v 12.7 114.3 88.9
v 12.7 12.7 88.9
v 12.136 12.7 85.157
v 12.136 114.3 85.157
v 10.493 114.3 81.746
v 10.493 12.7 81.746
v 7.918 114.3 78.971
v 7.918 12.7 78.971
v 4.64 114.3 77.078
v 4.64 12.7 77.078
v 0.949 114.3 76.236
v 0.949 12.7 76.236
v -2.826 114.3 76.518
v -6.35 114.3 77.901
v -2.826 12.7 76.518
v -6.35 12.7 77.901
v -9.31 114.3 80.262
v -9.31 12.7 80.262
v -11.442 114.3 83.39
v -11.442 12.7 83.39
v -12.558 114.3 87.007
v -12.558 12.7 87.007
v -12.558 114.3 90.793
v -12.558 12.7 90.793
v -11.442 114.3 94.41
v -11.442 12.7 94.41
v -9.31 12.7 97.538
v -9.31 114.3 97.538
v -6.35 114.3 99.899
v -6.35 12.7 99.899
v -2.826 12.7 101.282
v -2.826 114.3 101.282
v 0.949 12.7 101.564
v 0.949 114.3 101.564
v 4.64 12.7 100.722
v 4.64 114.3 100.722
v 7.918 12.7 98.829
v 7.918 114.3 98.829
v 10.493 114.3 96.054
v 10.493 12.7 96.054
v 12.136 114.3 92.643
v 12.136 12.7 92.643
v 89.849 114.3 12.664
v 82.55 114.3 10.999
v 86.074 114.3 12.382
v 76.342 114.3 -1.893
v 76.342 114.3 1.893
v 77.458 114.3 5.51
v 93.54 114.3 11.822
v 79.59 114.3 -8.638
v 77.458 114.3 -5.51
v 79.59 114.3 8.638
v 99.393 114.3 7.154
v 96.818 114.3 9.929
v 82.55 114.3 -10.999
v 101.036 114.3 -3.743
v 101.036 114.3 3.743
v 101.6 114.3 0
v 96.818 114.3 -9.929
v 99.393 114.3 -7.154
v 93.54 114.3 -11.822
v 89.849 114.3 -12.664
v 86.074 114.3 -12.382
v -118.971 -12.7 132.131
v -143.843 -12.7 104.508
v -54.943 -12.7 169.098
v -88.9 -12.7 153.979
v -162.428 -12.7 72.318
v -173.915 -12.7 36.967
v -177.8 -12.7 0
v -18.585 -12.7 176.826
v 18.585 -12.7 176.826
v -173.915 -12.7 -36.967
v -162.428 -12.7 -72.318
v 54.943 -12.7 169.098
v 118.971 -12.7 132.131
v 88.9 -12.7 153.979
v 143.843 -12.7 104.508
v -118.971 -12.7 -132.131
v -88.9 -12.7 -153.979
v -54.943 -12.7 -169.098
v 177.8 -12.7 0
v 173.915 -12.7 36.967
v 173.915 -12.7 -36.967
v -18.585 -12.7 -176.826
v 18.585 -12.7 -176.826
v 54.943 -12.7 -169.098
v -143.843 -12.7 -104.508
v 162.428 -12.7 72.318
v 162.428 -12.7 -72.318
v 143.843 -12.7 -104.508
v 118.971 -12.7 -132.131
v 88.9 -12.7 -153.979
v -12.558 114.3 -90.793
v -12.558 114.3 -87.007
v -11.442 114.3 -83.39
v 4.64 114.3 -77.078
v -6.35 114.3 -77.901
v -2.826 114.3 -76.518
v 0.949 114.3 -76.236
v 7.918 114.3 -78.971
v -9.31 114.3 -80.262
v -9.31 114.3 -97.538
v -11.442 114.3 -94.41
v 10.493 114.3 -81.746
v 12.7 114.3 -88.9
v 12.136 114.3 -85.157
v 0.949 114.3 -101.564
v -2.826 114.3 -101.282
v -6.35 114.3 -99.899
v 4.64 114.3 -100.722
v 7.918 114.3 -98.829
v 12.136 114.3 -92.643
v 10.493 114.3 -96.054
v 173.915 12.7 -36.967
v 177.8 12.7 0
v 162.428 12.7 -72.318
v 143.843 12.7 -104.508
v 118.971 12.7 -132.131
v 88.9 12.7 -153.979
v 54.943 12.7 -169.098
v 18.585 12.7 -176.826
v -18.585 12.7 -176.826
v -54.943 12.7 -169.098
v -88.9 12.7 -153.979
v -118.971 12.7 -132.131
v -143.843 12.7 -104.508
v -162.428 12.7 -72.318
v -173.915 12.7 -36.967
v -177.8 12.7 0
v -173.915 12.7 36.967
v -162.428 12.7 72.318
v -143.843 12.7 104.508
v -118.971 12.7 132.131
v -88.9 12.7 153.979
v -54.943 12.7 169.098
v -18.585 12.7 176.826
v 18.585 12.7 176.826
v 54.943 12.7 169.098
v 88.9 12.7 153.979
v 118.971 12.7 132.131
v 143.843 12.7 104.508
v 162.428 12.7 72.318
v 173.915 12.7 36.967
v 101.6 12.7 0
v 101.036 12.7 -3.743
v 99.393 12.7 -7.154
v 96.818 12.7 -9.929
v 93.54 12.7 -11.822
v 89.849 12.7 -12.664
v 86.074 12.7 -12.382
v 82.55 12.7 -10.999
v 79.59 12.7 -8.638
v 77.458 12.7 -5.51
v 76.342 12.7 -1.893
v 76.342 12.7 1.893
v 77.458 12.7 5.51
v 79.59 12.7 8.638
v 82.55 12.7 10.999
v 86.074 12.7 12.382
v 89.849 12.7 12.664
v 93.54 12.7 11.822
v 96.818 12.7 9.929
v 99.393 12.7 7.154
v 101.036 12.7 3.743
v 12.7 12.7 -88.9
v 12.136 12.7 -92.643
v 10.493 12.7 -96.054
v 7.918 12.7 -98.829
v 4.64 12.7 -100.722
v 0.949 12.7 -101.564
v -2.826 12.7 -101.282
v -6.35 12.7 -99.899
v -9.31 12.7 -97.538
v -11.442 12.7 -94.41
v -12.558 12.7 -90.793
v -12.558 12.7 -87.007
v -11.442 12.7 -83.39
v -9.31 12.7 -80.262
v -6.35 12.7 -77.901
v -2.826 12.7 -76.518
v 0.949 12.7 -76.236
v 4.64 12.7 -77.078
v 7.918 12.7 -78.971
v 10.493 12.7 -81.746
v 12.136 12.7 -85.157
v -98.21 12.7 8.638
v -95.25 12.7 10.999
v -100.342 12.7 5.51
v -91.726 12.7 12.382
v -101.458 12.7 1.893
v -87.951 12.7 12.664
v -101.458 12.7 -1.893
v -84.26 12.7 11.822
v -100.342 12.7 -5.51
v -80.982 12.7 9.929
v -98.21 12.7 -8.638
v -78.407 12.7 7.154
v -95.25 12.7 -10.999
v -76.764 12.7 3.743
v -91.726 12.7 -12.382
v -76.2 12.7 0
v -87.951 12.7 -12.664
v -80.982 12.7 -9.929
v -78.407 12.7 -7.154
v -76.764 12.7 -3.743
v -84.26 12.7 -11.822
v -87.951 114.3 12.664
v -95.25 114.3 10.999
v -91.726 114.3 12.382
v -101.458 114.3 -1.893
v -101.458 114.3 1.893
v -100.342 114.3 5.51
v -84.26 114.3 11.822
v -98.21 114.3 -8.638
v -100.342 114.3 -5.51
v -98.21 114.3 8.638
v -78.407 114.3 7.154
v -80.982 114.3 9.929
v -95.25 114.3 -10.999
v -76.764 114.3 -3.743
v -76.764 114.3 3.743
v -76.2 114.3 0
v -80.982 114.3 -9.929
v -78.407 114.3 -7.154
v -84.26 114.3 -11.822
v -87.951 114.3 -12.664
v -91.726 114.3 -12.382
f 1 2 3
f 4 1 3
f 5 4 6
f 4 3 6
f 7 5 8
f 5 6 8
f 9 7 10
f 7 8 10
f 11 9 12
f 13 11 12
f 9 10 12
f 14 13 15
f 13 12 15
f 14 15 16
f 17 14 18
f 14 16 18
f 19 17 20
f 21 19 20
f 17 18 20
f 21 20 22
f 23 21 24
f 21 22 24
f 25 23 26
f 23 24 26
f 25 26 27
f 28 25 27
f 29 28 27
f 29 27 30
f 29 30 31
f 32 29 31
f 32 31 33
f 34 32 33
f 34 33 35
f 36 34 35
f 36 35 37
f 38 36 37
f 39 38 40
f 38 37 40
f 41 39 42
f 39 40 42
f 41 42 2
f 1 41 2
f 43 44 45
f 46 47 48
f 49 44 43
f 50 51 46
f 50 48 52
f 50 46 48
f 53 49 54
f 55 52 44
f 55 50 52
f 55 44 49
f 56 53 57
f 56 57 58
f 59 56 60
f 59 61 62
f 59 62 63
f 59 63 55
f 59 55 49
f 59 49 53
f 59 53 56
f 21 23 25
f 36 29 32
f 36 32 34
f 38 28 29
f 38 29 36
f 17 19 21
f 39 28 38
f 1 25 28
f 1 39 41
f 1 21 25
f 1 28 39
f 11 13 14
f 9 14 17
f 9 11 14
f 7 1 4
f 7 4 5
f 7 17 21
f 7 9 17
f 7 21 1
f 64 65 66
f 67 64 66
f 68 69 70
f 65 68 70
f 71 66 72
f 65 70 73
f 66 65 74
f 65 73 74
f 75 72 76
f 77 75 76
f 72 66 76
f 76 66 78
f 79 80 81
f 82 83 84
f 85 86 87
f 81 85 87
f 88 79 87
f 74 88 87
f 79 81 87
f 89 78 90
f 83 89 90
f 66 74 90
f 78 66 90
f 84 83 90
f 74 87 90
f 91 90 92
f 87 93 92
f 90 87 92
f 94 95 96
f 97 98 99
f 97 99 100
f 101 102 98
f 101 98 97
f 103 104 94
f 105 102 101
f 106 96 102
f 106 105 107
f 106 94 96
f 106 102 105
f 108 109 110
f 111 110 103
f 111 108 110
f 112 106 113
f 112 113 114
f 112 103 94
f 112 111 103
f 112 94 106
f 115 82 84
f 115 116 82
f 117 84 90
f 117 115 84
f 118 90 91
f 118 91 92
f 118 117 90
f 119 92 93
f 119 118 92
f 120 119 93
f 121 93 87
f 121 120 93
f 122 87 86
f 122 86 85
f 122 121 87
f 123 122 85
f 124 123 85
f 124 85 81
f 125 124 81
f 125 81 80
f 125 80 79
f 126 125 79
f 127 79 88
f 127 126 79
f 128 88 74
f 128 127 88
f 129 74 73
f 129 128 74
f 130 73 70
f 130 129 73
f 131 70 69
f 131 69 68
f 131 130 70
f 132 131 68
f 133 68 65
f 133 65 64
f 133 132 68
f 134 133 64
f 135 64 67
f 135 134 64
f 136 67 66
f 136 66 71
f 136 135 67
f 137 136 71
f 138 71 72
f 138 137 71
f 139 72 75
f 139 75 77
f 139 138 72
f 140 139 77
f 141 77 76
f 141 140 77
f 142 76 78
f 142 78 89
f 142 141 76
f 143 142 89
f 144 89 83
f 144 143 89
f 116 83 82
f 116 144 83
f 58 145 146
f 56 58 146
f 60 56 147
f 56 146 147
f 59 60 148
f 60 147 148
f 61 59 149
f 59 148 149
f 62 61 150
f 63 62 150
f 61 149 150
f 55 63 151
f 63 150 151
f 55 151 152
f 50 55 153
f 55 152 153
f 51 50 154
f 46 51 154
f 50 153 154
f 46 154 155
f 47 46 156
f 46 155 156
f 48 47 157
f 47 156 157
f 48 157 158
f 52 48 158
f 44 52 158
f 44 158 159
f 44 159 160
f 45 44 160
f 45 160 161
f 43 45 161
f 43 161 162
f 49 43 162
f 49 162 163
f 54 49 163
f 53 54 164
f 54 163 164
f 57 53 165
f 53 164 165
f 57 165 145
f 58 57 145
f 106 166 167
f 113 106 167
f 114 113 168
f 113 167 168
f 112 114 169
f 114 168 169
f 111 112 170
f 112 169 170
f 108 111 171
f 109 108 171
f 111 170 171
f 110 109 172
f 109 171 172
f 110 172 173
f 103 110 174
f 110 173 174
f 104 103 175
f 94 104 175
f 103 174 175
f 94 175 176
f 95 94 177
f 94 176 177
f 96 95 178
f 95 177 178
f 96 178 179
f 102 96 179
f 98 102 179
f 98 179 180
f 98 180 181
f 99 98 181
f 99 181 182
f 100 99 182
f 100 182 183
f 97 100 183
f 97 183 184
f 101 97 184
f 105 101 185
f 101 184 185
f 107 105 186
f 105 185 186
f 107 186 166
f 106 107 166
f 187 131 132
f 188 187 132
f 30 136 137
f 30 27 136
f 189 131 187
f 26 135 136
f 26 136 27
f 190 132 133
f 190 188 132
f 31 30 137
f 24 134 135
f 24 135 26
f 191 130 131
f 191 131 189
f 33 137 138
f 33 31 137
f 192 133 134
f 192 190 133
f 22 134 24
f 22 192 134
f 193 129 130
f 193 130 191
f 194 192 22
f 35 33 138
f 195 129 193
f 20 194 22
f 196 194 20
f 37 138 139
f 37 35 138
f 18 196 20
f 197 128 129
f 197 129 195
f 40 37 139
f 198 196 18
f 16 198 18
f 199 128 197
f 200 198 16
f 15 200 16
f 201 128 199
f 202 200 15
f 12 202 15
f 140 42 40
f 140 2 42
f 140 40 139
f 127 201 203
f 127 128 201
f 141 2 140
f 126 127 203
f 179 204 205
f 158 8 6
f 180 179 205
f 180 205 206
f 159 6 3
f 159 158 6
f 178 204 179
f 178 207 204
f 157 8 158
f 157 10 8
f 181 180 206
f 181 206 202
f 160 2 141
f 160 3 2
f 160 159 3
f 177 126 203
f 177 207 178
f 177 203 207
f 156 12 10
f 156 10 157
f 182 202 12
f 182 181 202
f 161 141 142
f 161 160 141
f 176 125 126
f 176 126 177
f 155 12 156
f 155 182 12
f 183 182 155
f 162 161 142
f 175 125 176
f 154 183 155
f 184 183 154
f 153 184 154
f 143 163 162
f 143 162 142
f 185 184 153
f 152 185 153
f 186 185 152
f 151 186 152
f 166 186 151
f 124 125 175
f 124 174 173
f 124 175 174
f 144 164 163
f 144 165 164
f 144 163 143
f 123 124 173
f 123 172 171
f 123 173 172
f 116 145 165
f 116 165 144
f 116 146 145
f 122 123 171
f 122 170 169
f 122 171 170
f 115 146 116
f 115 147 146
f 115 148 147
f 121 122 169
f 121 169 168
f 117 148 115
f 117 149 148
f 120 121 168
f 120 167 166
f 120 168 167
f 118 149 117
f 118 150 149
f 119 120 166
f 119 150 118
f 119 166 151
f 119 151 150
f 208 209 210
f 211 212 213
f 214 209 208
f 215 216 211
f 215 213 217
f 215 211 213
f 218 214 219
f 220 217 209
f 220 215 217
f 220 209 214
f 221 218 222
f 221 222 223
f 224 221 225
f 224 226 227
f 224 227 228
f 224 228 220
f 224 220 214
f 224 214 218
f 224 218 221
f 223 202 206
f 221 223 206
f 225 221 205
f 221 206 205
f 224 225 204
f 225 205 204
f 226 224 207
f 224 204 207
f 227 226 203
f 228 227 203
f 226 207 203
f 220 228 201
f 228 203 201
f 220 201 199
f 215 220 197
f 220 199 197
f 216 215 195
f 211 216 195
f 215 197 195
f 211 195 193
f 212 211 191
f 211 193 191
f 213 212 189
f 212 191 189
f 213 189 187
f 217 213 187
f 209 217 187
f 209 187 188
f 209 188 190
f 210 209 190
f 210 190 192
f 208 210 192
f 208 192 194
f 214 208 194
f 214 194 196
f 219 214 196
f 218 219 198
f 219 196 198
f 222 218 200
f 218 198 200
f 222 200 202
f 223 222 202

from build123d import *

# Parameters (mm, degrees)
SKETCH1_R           = 177.8
BOSS_EXTRUDE1_DEPTH = 12.7
SKETCH2_R           = 12.7
BOSS_EXTRUDE2_DEPTH = 101.6


with BuildPart() as part:
    # Sketch1 → Boss-Extrude1 (new body, symmetric)
    with BuildSketch(Plane(origin=(0, 0, 0), x_dir=(1, 0, 0), z_dir=(0, 1, 0))):
        Circle(SKETCH1_R)
    extrude(amount=BOSS_EXTRUDE1_DEPTH, both=True)

    # Sketch2 → Boss-Extrude2 (add)
    with BuildSketch(Plane(origin=(0, 12.7, 0), x_dir=(1, 0, 0), z_dir=(0, 1, 0))):
        with Locations((0, 88.9)):
            Circle(SKETCH2_R)
        with Locations((0, -88.9)):
            Circle(SKETCH2_R)
        with Locations((88.9, 0)):
            Circle(SKETCH2_R)
        with Locations((-88.9, 0)):
            Circle(SKETCH2_R)
    extrude(amount=BOSS_EXTRUDE2_DEPTH)


solid = part.part
